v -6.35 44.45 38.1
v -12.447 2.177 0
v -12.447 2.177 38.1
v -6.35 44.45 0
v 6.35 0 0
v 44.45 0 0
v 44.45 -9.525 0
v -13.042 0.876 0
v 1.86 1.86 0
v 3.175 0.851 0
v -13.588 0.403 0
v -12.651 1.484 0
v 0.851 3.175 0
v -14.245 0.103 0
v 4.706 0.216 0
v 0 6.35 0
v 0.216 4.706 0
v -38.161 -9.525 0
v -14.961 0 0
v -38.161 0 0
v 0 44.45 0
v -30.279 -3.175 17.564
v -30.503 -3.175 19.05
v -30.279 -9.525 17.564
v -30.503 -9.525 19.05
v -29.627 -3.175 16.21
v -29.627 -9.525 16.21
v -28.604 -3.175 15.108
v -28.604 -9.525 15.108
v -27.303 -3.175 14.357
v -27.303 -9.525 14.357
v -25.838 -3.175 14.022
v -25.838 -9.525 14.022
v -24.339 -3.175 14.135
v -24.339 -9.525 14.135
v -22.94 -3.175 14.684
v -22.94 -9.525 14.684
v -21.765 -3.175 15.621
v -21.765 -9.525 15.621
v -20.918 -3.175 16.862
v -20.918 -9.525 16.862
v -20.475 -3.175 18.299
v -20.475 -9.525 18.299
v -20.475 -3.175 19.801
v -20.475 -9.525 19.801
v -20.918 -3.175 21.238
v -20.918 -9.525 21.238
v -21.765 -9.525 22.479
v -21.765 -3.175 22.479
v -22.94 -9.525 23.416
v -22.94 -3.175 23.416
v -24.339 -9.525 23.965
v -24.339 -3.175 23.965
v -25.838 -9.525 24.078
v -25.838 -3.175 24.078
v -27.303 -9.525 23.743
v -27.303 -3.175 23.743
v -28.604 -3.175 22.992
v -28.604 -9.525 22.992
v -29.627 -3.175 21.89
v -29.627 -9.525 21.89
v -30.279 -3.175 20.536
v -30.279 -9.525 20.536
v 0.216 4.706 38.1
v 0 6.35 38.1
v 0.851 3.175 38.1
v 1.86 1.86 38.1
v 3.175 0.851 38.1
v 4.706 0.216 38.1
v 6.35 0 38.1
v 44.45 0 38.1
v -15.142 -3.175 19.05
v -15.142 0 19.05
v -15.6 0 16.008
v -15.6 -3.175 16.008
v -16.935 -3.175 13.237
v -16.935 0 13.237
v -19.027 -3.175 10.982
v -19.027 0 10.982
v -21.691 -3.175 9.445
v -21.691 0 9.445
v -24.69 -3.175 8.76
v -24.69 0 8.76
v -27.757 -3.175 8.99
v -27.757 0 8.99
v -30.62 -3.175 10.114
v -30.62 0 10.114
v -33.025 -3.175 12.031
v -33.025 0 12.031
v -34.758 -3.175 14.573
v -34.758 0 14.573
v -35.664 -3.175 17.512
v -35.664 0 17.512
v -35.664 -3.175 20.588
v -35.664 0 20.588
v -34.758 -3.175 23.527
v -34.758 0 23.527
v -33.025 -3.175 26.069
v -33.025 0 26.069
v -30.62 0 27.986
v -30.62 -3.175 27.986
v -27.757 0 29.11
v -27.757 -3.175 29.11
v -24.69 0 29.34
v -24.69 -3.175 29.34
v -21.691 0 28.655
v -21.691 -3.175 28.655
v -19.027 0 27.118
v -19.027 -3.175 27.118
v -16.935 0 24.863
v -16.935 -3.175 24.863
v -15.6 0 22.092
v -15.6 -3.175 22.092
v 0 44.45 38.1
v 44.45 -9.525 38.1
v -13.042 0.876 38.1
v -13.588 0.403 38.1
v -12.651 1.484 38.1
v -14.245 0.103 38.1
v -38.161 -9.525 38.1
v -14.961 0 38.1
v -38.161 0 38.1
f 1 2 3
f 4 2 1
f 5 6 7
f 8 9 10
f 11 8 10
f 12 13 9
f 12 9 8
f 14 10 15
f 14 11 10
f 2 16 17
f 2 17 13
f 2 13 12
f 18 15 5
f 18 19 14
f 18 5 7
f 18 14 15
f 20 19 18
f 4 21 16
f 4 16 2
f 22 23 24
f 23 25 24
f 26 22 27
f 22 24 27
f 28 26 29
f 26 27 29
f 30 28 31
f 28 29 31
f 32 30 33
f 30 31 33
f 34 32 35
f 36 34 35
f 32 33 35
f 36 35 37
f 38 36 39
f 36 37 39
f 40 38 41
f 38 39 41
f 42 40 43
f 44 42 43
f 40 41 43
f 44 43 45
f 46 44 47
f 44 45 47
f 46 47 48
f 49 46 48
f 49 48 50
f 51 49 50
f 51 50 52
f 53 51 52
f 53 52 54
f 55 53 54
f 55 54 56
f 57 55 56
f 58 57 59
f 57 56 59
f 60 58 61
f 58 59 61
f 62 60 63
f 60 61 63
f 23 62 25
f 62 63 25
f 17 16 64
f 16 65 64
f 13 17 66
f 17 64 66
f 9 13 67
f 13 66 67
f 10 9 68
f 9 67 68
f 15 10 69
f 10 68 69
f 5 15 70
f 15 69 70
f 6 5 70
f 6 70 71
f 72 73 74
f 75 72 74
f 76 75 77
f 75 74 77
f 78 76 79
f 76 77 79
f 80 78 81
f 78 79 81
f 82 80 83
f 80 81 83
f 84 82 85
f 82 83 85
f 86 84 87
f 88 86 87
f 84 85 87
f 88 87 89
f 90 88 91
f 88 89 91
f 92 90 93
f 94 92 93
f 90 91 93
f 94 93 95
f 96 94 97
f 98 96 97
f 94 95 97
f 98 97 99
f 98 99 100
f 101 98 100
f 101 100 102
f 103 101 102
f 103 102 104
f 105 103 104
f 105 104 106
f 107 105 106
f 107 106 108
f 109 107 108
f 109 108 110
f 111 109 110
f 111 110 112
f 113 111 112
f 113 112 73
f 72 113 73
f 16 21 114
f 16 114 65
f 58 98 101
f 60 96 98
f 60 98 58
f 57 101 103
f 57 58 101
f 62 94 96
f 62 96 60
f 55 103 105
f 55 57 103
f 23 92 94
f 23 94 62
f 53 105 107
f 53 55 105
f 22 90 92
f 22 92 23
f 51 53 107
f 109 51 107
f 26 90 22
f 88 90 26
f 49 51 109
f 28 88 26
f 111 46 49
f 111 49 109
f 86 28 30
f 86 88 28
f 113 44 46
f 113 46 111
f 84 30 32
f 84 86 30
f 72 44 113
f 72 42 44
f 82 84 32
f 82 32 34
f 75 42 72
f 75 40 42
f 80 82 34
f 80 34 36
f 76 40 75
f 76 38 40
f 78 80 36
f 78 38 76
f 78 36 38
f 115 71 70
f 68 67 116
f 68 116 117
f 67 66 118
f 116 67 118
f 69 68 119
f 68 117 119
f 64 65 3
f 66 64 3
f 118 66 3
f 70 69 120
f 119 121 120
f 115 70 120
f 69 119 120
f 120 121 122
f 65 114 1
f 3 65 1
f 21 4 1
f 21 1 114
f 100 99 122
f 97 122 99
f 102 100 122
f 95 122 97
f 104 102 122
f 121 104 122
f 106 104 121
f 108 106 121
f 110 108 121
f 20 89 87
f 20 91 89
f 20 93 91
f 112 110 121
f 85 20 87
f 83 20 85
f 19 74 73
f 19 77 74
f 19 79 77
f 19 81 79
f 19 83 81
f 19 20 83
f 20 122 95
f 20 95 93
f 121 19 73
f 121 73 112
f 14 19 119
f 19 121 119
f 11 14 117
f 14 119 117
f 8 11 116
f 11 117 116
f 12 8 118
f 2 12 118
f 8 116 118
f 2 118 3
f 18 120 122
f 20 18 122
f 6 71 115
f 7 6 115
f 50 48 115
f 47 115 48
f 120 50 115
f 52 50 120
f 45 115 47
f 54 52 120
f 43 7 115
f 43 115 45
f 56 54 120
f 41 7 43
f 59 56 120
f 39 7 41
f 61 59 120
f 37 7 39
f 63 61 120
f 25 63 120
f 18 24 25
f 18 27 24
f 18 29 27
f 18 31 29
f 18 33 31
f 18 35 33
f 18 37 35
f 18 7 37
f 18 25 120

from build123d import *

# Parameters (mm, degrees)
BOSS_EXTRUDE1_DEPTH                                  = 38.1
CBORE_FOR_3_8_BINDING_HEAD_MACHINE_SCREW_D           = 10.0838
CBORE_FOR_3_8_BINDING_HEAD_MACHINE_SCREW_CBORE_D     = 20.6375
CBORE_FOR_3_8_BINDING_HEAD_MACHINE_SCREW_CBORE_DEPTH = 3.175
FILLET1_R                                            = 2.54
FILLET2_R                                            = 6.35


with BuildPart() as part:
    # Sketch1 → Boss-Extrude1 (new body)
    with BuildSketch(Plane.XY):
        Polygon((0, 0), (44.45, 0), (44.45, -9.525), (-38.1608076, -9.525), (-38.1608076, 0), (-12.7608076, 0), (-6.35, 44.45), (0, 44.45), align=None)
    extrude(amount=BOSS_EXTRUDE1_DEPTH)

    # CBORE for 3/8 Binding Head Machine Screw1 (through all)
    with Locations(Plane(origin=(0, 0, 0), x_dir=(1, 0, 0), z_dir=(0, 1, 0))):
        with Locations((-25.4608076, -19.05)):
            CounterBoreHole(CBORE_FOR_3_8_BINDING_HEAD_MACHINE_SCREW_D / 2, CBORE_FOR_3_8_BINDING_HEAD_MACHINE_SCREW_CBORE_D / 2, CBORE_FOR_3_8_BINDING_HEAD_MACHINE_SCREW_CBORE_DEPTH)

    # Fillet1
    fillet1_edges = [part.edges().sort_by_distance(p)[0] for p in [
        (-12.7608076, 0, 19.05),
    ]]
    fillet(fillet1_edges, radius=FILLET1_R)

    # Fillet2
    fillet2_edges = [part.edges().sort_by_distance(p)[0] for p in [
        (0, 0, 19.05),
    ]]
    fillet(fillet2_edges, radius=FILLET2_R)


solid = part.part
